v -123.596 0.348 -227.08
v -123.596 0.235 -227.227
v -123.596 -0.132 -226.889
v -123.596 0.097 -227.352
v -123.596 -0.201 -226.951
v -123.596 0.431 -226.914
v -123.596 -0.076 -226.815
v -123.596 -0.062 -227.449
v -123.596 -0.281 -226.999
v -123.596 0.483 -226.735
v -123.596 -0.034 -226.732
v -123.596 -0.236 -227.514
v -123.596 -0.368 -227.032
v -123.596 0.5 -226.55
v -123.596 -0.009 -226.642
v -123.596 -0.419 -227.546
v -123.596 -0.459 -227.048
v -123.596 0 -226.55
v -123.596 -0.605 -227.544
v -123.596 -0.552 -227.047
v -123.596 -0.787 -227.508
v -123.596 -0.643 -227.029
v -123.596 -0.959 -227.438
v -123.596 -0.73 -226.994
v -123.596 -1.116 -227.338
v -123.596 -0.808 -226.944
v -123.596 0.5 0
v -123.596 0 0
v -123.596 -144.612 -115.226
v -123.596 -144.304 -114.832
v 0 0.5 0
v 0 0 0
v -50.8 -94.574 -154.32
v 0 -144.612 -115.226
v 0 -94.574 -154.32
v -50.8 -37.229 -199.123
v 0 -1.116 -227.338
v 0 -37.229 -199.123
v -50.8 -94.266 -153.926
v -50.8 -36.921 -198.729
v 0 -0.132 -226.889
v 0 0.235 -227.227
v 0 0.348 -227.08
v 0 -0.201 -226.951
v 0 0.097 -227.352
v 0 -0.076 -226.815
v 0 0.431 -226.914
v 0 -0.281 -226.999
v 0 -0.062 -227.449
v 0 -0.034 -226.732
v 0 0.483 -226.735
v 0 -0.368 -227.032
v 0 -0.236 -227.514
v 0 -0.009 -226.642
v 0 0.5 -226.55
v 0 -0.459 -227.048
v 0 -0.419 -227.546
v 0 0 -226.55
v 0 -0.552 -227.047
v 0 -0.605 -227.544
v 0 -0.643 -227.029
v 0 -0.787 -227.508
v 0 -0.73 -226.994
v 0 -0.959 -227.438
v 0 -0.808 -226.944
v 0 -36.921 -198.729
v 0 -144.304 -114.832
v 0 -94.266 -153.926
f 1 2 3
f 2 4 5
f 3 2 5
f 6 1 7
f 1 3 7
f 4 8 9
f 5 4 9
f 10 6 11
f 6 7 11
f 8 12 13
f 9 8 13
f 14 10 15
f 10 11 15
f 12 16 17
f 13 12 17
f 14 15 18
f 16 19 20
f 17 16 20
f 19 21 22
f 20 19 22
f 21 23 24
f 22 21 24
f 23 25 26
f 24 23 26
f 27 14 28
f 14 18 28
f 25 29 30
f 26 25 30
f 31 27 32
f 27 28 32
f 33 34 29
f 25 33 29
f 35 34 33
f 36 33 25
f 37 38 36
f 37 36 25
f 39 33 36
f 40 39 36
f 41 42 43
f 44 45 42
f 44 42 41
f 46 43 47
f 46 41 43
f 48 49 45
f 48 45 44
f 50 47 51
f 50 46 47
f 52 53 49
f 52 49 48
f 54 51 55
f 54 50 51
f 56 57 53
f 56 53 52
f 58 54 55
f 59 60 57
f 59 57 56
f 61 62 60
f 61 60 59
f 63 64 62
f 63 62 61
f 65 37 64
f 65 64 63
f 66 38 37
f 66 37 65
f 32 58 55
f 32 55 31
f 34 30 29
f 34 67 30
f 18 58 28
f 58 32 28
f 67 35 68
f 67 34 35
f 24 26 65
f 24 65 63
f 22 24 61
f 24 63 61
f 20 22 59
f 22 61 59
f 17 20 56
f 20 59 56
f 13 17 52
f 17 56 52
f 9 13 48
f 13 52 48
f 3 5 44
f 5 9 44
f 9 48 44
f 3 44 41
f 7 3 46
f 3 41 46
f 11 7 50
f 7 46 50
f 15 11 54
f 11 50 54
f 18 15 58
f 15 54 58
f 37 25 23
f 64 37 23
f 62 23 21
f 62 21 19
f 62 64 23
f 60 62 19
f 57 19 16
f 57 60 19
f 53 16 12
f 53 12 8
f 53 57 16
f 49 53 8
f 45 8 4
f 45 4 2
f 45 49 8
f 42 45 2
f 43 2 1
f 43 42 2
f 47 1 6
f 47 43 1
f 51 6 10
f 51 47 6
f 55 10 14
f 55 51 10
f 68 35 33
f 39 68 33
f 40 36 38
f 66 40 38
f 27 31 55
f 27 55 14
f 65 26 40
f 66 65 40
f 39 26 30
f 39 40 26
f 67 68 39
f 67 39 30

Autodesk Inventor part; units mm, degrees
ref_plane "YZ Plane" through (0, 0, 0) normal (1, 0, 0) x (0, 1, 0)
ref_plane "XZ Plane" through (0, 0, 0) normal (0, 1, 0) x (-1, 0, 0)
ref_plane "XY Plane" through (0, 0, 0) normal (0, 0, 1) x (1, 0, 0)
sketch "Sketch1" plane through (0, 0, 0) normal (0, 1, 0) x (-1, 0, 0)
  line L0 (0, 0) -> (0, -228.6)
  line L1 (0, -228.6) -> (123.5964, -228.6)
  line L2 (123.5964, -228.6) -> (123.5964, 0)
  line L3 (123.5964, 0) -> (0, 0)
  dimension "d0" = 228.6
  dimension "d1" = 123.5964
extrude "Plate1" add sketch "Sketch1" along normal blind 0.5
sketch "Sketch2" plane through (0, 0.8078, -228.206) normal (0, -0.6156615, -0.7880108) x (1, 0, 0)
  line L0 (-123.5964, 0) -> (0, 0)
  line L1 (0, 0) -> (0, 184.15)
  line L2 (0, 184.15) -> (-123.5964, 184.15)
  line L3 (-123.5964, 184.15) -> (-123.5964, 0)
edge flange "Flange1" height 184.15 angle 128 thickness 0.5 bend radius 0.5 thickness toward (0, -0.6156615, -0.7880108) relief tear relief width 0.5 relief depth 0.25 edges at (-61.7982, 0, -228.6) wall of the first edge with corners at (-123.5964, 0.8078, -228.206) (0, 0.8078, -228.206) (0, -144.3043, -114.8319) (-123.5964, -144.3043, -114.8319)
bend "Bend1"
corner "Corner1"
ref_plane "Work Plane2" through (-123.5964, 0, -114.3) normal (0, 0, -1) x (1, 0, 0)
ref_plane "Work Plane1" through (-123.5964, 0, 0) normal (0, 0, -1) x (1, 0, 0)
sketch "Sketch4" plane through (0, -144.6122, -115.2259) normal (0, -0.6156615, -0.7880108) x (-1, 0, 0)
  line L0 (0, 63.5) -> (50.8, 63.5)
  line L1 (50.8, 63.5) -> (50.8, 136.271)
  line L2 (50.8, 136.271) -> (0, 136.271)
  line L3 (0, 0) -> (0, 182.0997) projected
  line L4 (0, 63.5) -> (0, 136.271)
  line L5 (123.5964, 0) -> (0, 0) projected
  dimension "d22" = 50.8
  dimension "d23" = 63.5
  dimension "d24" = 72.771
extrude "Cut2" cut sketch "Sketch4" against normal blind 0.5
equation "\"d25\" = Thickness"
equation "\"d3\" = BendReliefWidth"
equation "\"d4\" = BendReliefDepth"
equation "\"d5\" = MinimumRemnant"
equation "\"d6\" = BendRadius"
equation "\"d9\" = BendRadius"
equation "\"d10\" = CornerReliefSize"
equation "\"d11\" = GapSize"
equation "\"d12\" = JacobiRadiusSize"
equation "\"BendRadius\" = Thickness"
equation "\"BendReliefWidth\" = Thickness"
equation "\"BendReliefDepth\" = 0.5 * Thickness"
equation "\"CornerReliefSize\" = 4 * Thickness"
equation "\"MinimumRemnant\" = 2 * Thickness"
equation "\"TransitionRadius\" = BendRadius"
equation "\"JacobiRadiusSize\" = BendRadius"
equation "\"GapSize\" = Thickness"
equation "\"d2\" = BendRadius"
equation "\"Thickness\" = 0.5"
properties part number "Autofeeder frame1"
